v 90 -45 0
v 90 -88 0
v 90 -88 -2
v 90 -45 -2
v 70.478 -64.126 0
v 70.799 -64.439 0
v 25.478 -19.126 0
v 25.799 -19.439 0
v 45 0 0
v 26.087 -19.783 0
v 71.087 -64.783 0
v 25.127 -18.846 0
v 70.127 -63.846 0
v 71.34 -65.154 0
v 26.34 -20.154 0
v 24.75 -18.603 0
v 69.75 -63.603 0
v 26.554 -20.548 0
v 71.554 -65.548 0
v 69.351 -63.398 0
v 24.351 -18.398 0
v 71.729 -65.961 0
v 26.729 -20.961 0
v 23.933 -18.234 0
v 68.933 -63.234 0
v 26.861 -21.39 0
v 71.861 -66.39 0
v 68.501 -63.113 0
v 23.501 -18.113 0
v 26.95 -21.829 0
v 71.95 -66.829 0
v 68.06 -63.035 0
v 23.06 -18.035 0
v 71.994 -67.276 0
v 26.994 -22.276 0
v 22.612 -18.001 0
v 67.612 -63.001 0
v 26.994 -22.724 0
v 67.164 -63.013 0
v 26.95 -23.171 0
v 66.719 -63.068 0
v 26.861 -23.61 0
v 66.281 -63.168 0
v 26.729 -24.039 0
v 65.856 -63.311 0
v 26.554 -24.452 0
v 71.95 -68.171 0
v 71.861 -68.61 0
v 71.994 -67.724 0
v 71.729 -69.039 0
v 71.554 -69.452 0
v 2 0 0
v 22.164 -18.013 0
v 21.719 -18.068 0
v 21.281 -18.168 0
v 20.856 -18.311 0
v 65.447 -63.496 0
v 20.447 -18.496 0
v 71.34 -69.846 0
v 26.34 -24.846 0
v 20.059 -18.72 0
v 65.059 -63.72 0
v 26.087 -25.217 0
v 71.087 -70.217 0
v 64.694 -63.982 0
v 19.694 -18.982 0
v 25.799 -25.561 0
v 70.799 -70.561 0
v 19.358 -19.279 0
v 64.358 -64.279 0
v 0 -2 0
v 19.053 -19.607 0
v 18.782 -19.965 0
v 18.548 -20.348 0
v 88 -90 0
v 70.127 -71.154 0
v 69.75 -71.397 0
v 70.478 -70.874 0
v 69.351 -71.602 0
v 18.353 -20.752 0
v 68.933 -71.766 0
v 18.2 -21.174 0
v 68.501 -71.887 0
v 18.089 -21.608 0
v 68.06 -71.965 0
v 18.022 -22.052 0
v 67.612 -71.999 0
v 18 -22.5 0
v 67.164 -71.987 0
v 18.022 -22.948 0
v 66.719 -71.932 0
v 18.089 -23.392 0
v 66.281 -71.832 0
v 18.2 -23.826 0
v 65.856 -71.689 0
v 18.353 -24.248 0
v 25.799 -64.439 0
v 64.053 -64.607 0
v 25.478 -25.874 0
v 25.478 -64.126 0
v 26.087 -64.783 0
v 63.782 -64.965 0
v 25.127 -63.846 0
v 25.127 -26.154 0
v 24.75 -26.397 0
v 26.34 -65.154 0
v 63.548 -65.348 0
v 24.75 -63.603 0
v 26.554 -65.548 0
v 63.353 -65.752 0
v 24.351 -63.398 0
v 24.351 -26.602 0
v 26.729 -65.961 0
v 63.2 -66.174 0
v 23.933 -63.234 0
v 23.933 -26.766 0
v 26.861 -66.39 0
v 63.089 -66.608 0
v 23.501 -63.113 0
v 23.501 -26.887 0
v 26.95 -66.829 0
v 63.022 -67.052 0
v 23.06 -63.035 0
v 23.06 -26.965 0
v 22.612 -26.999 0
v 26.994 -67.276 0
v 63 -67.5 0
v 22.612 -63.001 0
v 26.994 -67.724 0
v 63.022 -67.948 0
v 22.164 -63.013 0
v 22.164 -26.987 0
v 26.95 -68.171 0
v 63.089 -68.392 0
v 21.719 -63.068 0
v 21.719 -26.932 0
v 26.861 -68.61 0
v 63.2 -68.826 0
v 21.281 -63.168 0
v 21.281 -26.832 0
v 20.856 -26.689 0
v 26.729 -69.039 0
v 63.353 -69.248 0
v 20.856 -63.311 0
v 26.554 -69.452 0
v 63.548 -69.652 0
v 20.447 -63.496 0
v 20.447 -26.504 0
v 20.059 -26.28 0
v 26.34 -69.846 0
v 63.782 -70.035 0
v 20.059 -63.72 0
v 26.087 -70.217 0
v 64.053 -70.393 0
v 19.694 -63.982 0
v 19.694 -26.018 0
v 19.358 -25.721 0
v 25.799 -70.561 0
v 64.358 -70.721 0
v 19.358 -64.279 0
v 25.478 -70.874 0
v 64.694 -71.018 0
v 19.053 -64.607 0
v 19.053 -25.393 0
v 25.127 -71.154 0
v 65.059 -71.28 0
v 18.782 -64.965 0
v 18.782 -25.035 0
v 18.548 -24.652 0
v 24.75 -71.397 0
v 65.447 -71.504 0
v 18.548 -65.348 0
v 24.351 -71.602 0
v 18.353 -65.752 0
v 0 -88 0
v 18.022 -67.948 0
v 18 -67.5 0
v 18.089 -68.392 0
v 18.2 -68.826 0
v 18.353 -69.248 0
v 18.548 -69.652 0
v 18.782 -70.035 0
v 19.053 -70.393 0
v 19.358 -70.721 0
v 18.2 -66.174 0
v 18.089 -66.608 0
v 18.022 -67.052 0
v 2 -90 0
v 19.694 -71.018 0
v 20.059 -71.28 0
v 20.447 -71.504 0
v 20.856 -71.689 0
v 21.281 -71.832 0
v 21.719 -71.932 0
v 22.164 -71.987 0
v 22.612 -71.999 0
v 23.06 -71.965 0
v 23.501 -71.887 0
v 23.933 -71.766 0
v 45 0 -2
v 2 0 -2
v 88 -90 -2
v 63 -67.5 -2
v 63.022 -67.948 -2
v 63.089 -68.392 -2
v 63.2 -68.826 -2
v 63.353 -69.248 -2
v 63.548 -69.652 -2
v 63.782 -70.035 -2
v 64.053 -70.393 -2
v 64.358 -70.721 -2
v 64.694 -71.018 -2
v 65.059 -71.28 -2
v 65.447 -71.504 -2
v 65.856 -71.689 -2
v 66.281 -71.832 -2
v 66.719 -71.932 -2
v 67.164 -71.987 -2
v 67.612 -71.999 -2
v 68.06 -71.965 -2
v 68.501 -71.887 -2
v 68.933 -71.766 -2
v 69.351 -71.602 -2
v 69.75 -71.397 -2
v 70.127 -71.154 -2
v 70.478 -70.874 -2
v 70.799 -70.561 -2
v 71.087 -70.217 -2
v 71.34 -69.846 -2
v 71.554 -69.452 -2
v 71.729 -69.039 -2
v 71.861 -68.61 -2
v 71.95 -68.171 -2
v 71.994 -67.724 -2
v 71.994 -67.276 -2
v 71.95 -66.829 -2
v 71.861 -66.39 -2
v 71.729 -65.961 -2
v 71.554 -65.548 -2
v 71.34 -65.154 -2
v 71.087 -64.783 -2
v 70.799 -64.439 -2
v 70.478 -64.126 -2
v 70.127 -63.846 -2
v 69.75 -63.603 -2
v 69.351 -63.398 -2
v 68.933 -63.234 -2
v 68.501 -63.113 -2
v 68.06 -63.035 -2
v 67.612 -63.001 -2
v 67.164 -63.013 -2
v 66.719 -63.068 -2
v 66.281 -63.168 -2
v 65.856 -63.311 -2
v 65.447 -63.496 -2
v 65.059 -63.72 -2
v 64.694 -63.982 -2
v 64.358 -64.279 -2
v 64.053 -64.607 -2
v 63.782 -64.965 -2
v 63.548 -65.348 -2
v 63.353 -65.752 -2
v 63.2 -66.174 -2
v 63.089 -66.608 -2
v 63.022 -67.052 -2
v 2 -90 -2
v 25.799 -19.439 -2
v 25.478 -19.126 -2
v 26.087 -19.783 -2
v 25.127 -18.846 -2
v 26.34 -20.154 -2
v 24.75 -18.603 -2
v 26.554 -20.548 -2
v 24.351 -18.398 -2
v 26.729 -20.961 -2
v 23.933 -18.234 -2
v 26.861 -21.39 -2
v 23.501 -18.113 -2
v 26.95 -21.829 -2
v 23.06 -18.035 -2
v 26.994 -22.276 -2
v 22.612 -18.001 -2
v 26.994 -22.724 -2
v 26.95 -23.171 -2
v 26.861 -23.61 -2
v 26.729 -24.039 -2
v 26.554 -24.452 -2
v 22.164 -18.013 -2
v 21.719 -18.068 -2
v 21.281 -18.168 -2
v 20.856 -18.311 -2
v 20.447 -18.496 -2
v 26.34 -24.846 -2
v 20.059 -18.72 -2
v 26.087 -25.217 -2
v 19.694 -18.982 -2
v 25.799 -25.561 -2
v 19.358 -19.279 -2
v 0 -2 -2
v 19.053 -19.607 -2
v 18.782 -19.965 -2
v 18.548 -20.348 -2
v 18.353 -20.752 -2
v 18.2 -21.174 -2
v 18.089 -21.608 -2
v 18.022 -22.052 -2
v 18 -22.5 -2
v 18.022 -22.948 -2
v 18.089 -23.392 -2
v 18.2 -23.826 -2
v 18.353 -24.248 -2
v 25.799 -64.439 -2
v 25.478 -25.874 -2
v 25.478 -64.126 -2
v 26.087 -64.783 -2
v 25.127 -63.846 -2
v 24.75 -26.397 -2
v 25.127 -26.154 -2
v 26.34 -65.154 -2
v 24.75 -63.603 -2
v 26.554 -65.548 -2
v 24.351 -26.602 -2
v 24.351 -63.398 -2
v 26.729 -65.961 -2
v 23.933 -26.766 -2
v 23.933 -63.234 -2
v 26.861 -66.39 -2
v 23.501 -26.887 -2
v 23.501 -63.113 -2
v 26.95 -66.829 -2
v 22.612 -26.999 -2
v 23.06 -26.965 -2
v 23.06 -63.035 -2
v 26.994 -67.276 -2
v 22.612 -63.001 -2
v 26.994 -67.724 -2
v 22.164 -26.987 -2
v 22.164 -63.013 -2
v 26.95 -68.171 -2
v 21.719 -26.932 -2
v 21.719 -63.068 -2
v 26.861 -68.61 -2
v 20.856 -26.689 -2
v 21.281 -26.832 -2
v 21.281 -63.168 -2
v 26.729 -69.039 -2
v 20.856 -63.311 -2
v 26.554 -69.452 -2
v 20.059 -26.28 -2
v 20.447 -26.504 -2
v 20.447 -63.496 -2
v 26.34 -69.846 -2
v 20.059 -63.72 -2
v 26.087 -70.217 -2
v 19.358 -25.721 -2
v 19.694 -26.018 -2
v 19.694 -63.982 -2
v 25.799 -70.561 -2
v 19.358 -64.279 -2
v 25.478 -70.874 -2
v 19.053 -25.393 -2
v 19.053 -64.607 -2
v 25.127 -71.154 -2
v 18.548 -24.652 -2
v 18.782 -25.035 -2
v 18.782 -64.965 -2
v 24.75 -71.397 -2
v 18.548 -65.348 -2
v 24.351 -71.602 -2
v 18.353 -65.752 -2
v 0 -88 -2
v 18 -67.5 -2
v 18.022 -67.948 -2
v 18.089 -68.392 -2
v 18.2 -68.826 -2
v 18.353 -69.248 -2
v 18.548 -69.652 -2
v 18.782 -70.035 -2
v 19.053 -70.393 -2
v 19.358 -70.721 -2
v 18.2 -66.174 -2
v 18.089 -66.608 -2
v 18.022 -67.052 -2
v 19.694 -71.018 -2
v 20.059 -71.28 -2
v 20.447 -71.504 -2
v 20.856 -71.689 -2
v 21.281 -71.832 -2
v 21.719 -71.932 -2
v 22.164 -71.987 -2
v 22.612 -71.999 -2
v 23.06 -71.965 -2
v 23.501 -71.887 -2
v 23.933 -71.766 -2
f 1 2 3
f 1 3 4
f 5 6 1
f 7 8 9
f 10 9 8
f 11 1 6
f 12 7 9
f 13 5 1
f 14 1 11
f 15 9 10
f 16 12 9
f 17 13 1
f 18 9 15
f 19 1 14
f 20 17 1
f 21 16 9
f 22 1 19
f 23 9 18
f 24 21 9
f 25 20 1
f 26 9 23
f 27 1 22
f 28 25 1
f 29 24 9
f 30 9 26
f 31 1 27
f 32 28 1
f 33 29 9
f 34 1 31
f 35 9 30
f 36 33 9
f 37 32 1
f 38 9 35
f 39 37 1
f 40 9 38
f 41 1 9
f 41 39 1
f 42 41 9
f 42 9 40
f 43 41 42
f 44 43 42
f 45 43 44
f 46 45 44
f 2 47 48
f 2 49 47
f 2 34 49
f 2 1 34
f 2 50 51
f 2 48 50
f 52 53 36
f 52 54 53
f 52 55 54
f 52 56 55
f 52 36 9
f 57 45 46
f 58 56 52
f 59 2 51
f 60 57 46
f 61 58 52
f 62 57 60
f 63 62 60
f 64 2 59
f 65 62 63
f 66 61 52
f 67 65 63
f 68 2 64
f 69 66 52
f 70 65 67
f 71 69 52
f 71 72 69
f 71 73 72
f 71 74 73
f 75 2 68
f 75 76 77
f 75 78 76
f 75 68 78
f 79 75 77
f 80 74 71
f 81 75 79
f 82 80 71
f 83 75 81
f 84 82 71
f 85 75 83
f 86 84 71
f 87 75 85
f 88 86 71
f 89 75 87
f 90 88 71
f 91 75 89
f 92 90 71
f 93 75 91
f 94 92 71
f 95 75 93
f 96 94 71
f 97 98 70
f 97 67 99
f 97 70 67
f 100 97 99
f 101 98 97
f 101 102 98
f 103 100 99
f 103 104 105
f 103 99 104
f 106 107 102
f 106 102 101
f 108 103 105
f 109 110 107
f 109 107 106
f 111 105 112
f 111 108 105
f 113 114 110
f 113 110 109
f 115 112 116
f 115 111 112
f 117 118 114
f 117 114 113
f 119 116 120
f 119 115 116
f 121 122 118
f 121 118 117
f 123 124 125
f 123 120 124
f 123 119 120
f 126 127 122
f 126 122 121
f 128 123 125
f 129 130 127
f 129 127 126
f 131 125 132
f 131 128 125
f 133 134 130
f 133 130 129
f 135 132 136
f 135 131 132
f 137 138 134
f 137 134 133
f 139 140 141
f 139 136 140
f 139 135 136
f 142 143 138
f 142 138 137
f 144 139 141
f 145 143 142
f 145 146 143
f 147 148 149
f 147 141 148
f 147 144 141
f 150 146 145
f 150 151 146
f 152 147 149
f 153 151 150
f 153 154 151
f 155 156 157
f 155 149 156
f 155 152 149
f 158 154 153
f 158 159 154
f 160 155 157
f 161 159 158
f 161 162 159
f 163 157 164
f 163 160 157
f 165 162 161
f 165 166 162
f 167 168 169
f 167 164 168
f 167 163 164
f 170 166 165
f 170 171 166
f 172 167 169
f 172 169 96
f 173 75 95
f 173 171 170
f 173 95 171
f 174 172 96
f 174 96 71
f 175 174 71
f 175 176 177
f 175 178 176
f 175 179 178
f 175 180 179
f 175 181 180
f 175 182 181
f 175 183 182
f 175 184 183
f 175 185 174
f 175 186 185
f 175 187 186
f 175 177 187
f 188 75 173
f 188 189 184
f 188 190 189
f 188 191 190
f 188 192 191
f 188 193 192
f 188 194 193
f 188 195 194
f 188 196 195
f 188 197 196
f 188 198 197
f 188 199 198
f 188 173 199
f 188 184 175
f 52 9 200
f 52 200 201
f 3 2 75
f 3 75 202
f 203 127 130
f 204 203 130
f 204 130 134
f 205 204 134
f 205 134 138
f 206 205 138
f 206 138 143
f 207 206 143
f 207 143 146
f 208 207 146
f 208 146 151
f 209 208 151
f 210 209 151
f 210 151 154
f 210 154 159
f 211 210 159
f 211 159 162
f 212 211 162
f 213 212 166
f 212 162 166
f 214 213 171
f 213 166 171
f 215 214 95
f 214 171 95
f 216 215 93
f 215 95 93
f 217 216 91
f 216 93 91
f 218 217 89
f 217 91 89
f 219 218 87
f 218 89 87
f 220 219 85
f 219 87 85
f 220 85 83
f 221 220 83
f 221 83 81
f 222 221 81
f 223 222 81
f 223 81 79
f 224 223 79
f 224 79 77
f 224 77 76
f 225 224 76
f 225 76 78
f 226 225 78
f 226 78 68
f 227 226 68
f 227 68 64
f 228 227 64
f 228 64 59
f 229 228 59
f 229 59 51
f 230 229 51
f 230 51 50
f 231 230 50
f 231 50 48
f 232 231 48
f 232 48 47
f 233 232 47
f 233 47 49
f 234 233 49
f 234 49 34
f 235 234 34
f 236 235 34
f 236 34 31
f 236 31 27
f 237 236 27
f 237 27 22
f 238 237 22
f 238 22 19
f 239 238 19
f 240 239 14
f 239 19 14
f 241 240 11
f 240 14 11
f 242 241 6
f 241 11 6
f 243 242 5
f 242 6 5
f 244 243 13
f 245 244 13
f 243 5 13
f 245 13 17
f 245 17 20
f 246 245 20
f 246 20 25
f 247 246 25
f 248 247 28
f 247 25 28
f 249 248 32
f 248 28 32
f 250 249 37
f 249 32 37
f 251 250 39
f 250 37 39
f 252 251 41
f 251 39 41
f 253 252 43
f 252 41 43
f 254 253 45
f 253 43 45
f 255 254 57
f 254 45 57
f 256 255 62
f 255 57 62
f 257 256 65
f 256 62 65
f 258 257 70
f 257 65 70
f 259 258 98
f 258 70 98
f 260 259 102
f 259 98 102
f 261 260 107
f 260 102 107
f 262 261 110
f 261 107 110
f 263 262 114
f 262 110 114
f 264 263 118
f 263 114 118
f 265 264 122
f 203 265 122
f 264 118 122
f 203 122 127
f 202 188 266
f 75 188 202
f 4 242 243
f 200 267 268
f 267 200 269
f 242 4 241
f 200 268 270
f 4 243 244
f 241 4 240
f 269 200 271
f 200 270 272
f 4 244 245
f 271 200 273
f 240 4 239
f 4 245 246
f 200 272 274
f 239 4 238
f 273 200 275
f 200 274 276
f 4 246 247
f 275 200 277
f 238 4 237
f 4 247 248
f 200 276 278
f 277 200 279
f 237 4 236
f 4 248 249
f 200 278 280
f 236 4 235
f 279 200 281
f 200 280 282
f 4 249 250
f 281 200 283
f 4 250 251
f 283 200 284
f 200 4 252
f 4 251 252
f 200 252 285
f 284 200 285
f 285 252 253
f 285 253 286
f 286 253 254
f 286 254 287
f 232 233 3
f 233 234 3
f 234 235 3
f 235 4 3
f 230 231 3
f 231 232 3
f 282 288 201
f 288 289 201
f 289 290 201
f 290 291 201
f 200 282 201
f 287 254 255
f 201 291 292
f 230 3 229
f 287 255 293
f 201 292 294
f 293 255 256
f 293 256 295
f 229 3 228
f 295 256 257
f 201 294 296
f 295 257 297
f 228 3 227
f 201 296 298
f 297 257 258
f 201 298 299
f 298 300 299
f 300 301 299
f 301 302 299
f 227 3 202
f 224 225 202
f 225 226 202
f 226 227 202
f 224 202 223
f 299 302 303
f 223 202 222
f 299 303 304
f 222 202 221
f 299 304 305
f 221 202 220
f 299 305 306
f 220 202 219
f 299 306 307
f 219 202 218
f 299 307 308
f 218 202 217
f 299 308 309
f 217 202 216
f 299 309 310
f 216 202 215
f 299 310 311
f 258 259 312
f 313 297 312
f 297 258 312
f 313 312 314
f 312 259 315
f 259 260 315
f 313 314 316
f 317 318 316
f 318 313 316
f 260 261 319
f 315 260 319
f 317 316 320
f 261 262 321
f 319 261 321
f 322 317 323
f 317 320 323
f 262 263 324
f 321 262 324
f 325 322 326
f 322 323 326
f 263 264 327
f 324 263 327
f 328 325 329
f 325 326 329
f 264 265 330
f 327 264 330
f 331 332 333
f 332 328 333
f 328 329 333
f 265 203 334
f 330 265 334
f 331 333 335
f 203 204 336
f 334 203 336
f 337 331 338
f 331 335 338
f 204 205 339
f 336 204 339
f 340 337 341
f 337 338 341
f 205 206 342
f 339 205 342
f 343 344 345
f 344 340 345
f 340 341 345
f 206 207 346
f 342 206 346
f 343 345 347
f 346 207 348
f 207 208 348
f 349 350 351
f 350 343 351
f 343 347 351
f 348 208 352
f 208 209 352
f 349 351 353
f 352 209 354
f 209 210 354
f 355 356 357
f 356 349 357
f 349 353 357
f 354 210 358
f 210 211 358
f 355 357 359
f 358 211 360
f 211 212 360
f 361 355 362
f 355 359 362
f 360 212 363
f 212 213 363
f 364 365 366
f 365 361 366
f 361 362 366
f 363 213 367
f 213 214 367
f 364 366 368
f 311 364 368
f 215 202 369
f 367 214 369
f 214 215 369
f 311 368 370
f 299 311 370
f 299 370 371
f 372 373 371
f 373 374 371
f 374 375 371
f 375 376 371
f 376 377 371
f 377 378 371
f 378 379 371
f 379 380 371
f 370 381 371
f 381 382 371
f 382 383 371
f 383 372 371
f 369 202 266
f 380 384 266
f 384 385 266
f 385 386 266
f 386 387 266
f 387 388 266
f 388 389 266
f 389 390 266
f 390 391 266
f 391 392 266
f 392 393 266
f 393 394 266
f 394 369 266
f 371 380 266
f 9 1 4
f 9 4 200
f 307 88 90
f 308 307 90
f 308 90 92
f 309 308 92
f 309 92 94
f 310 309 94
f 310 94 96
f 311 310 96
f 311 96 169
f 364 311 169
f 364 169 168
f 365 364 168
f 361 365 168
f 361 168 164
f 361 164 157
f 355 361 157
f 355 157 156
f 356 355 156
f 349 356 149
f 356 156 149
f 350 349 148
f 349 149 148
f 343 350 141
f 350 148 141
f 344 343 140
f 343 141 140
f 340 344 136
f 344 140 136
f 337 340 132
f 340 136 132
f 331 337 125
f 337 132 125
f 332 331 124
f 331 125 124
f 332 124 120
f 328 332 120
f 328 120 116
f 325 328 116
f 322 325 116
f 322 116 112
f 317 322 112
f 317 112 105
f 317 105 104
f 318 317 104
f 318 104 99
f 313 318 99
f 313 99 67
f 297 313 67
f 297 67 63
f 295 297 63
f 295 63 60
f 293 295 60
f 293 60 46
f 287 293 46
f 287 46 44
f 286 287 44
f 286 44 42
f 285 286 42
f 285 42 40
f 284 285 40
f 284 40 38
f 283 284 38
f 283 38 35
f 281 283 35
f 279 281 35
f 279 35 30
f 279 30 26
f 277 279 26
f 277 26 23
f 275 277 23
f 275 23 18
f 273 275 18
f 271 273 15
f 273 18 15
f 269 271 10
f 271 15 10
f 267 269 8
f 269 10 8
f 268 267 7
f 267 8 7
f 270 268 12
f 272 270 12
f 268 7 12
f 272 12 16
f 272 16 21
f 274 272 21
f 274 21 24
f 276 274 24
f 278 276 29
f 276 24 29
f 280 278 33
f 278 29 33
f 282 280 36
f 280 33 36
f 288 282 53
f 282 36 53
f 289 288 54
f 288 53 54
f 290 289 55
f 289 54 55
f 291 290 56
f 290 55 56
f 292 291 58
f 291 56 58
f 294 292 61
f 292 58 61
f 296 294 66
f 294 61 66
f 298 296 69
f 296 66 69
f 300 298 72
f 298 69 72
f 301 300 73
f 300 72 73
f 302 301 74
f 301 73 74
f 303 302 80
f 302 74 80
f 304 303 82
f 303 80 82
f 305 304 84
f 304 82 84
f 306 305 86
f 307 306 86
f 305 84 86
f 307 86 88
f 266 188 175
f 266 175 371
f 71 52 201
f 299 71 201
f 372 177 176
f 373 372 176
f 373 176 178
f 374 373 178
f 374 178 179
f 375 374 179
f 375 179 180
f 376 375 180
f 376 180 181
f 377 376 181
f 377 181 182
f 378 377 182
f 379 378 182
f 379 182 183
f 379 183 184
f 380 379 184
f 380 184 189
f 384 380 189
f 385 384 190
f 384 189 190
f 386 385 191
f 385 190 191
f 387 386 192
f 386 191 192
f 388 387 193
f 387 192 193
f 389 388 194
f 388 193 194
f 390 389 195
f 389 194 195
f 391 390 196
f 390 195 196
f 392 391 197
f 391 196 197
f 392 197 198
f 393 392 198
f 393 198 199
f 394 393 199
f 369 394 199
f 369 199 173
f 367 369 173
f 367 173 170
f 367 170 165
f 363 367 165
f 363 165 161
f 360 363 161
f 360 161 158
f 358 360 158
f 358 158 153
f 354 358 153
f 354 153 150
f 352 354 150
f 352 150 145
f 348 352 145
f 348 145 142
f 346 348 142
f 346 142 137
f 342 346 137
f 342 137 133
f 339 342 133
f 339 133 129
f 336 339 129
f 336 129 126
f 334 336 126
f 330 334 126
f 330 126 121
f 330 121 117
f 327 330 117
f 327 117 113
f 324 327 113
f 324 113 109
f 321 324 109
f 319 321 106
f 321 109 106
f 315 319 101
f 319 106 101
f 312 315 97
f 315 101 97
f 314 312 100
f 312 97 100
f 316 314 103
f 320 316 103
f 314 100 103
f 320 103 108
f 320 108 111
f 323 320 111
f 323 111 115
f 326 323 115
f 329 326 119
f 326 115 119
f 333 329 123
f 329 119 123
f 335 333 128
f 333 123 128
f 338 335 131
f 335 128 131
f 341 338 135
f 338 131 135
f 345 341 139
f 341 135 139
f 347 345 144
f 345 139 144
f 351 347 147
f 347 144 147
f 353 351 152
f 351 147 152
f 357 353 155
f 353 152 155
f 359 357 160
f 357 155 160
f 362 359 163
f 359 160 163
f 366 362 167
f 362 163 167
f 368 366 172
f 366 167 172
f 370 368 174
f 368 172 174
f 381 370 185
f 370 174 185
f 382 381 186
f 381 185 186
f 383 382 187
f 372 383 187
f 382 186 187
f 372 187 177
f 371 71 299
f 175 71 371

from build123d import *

# Parameters (mm, degrees)
EXTRUDE_1_DEPTH   = 2
HOLE_WIZARD_M81_D = 9
CHAMFER_1_SIZE    = 2


with BuildPart() as part:
    # Эскиз1 → Бобышка-Вытянуть1 (new body)
    with BuildSketch(Plane(origin=(0, 0, 0), x_dir=(1, 0, 0), z_dir=(0, 0, -1))):
        Polygon((0, 0), (0, 90), (90, 90), (90, 45), (45, 0), align=None)
    extrude(amount=EXTRUDE_1_DEPTH)

    # Отверстие с зазором M81 (through all)
    with Locations(Plane(origin=(0, 0, -2), x_dir=(1, 0, 0), z_dir=(0, 0, -1))):
        with Locations((22.5, 67.5), (22.5, 22.5), (67.5, 67.5)):
            Hole(HOLE_WIZARD_M81_D / 2)

    # Фаска1
    chamfer_1_edges = [part.edges().sort_by_distance(p)[0] for p in [
        (0, 0, -1),
        (0, -90, -1),
        (90, -90, -1),
    ]]
    chamfer(chamfer_1_edges, length=CHAMFER_1_SIZE)


solid = part.part
